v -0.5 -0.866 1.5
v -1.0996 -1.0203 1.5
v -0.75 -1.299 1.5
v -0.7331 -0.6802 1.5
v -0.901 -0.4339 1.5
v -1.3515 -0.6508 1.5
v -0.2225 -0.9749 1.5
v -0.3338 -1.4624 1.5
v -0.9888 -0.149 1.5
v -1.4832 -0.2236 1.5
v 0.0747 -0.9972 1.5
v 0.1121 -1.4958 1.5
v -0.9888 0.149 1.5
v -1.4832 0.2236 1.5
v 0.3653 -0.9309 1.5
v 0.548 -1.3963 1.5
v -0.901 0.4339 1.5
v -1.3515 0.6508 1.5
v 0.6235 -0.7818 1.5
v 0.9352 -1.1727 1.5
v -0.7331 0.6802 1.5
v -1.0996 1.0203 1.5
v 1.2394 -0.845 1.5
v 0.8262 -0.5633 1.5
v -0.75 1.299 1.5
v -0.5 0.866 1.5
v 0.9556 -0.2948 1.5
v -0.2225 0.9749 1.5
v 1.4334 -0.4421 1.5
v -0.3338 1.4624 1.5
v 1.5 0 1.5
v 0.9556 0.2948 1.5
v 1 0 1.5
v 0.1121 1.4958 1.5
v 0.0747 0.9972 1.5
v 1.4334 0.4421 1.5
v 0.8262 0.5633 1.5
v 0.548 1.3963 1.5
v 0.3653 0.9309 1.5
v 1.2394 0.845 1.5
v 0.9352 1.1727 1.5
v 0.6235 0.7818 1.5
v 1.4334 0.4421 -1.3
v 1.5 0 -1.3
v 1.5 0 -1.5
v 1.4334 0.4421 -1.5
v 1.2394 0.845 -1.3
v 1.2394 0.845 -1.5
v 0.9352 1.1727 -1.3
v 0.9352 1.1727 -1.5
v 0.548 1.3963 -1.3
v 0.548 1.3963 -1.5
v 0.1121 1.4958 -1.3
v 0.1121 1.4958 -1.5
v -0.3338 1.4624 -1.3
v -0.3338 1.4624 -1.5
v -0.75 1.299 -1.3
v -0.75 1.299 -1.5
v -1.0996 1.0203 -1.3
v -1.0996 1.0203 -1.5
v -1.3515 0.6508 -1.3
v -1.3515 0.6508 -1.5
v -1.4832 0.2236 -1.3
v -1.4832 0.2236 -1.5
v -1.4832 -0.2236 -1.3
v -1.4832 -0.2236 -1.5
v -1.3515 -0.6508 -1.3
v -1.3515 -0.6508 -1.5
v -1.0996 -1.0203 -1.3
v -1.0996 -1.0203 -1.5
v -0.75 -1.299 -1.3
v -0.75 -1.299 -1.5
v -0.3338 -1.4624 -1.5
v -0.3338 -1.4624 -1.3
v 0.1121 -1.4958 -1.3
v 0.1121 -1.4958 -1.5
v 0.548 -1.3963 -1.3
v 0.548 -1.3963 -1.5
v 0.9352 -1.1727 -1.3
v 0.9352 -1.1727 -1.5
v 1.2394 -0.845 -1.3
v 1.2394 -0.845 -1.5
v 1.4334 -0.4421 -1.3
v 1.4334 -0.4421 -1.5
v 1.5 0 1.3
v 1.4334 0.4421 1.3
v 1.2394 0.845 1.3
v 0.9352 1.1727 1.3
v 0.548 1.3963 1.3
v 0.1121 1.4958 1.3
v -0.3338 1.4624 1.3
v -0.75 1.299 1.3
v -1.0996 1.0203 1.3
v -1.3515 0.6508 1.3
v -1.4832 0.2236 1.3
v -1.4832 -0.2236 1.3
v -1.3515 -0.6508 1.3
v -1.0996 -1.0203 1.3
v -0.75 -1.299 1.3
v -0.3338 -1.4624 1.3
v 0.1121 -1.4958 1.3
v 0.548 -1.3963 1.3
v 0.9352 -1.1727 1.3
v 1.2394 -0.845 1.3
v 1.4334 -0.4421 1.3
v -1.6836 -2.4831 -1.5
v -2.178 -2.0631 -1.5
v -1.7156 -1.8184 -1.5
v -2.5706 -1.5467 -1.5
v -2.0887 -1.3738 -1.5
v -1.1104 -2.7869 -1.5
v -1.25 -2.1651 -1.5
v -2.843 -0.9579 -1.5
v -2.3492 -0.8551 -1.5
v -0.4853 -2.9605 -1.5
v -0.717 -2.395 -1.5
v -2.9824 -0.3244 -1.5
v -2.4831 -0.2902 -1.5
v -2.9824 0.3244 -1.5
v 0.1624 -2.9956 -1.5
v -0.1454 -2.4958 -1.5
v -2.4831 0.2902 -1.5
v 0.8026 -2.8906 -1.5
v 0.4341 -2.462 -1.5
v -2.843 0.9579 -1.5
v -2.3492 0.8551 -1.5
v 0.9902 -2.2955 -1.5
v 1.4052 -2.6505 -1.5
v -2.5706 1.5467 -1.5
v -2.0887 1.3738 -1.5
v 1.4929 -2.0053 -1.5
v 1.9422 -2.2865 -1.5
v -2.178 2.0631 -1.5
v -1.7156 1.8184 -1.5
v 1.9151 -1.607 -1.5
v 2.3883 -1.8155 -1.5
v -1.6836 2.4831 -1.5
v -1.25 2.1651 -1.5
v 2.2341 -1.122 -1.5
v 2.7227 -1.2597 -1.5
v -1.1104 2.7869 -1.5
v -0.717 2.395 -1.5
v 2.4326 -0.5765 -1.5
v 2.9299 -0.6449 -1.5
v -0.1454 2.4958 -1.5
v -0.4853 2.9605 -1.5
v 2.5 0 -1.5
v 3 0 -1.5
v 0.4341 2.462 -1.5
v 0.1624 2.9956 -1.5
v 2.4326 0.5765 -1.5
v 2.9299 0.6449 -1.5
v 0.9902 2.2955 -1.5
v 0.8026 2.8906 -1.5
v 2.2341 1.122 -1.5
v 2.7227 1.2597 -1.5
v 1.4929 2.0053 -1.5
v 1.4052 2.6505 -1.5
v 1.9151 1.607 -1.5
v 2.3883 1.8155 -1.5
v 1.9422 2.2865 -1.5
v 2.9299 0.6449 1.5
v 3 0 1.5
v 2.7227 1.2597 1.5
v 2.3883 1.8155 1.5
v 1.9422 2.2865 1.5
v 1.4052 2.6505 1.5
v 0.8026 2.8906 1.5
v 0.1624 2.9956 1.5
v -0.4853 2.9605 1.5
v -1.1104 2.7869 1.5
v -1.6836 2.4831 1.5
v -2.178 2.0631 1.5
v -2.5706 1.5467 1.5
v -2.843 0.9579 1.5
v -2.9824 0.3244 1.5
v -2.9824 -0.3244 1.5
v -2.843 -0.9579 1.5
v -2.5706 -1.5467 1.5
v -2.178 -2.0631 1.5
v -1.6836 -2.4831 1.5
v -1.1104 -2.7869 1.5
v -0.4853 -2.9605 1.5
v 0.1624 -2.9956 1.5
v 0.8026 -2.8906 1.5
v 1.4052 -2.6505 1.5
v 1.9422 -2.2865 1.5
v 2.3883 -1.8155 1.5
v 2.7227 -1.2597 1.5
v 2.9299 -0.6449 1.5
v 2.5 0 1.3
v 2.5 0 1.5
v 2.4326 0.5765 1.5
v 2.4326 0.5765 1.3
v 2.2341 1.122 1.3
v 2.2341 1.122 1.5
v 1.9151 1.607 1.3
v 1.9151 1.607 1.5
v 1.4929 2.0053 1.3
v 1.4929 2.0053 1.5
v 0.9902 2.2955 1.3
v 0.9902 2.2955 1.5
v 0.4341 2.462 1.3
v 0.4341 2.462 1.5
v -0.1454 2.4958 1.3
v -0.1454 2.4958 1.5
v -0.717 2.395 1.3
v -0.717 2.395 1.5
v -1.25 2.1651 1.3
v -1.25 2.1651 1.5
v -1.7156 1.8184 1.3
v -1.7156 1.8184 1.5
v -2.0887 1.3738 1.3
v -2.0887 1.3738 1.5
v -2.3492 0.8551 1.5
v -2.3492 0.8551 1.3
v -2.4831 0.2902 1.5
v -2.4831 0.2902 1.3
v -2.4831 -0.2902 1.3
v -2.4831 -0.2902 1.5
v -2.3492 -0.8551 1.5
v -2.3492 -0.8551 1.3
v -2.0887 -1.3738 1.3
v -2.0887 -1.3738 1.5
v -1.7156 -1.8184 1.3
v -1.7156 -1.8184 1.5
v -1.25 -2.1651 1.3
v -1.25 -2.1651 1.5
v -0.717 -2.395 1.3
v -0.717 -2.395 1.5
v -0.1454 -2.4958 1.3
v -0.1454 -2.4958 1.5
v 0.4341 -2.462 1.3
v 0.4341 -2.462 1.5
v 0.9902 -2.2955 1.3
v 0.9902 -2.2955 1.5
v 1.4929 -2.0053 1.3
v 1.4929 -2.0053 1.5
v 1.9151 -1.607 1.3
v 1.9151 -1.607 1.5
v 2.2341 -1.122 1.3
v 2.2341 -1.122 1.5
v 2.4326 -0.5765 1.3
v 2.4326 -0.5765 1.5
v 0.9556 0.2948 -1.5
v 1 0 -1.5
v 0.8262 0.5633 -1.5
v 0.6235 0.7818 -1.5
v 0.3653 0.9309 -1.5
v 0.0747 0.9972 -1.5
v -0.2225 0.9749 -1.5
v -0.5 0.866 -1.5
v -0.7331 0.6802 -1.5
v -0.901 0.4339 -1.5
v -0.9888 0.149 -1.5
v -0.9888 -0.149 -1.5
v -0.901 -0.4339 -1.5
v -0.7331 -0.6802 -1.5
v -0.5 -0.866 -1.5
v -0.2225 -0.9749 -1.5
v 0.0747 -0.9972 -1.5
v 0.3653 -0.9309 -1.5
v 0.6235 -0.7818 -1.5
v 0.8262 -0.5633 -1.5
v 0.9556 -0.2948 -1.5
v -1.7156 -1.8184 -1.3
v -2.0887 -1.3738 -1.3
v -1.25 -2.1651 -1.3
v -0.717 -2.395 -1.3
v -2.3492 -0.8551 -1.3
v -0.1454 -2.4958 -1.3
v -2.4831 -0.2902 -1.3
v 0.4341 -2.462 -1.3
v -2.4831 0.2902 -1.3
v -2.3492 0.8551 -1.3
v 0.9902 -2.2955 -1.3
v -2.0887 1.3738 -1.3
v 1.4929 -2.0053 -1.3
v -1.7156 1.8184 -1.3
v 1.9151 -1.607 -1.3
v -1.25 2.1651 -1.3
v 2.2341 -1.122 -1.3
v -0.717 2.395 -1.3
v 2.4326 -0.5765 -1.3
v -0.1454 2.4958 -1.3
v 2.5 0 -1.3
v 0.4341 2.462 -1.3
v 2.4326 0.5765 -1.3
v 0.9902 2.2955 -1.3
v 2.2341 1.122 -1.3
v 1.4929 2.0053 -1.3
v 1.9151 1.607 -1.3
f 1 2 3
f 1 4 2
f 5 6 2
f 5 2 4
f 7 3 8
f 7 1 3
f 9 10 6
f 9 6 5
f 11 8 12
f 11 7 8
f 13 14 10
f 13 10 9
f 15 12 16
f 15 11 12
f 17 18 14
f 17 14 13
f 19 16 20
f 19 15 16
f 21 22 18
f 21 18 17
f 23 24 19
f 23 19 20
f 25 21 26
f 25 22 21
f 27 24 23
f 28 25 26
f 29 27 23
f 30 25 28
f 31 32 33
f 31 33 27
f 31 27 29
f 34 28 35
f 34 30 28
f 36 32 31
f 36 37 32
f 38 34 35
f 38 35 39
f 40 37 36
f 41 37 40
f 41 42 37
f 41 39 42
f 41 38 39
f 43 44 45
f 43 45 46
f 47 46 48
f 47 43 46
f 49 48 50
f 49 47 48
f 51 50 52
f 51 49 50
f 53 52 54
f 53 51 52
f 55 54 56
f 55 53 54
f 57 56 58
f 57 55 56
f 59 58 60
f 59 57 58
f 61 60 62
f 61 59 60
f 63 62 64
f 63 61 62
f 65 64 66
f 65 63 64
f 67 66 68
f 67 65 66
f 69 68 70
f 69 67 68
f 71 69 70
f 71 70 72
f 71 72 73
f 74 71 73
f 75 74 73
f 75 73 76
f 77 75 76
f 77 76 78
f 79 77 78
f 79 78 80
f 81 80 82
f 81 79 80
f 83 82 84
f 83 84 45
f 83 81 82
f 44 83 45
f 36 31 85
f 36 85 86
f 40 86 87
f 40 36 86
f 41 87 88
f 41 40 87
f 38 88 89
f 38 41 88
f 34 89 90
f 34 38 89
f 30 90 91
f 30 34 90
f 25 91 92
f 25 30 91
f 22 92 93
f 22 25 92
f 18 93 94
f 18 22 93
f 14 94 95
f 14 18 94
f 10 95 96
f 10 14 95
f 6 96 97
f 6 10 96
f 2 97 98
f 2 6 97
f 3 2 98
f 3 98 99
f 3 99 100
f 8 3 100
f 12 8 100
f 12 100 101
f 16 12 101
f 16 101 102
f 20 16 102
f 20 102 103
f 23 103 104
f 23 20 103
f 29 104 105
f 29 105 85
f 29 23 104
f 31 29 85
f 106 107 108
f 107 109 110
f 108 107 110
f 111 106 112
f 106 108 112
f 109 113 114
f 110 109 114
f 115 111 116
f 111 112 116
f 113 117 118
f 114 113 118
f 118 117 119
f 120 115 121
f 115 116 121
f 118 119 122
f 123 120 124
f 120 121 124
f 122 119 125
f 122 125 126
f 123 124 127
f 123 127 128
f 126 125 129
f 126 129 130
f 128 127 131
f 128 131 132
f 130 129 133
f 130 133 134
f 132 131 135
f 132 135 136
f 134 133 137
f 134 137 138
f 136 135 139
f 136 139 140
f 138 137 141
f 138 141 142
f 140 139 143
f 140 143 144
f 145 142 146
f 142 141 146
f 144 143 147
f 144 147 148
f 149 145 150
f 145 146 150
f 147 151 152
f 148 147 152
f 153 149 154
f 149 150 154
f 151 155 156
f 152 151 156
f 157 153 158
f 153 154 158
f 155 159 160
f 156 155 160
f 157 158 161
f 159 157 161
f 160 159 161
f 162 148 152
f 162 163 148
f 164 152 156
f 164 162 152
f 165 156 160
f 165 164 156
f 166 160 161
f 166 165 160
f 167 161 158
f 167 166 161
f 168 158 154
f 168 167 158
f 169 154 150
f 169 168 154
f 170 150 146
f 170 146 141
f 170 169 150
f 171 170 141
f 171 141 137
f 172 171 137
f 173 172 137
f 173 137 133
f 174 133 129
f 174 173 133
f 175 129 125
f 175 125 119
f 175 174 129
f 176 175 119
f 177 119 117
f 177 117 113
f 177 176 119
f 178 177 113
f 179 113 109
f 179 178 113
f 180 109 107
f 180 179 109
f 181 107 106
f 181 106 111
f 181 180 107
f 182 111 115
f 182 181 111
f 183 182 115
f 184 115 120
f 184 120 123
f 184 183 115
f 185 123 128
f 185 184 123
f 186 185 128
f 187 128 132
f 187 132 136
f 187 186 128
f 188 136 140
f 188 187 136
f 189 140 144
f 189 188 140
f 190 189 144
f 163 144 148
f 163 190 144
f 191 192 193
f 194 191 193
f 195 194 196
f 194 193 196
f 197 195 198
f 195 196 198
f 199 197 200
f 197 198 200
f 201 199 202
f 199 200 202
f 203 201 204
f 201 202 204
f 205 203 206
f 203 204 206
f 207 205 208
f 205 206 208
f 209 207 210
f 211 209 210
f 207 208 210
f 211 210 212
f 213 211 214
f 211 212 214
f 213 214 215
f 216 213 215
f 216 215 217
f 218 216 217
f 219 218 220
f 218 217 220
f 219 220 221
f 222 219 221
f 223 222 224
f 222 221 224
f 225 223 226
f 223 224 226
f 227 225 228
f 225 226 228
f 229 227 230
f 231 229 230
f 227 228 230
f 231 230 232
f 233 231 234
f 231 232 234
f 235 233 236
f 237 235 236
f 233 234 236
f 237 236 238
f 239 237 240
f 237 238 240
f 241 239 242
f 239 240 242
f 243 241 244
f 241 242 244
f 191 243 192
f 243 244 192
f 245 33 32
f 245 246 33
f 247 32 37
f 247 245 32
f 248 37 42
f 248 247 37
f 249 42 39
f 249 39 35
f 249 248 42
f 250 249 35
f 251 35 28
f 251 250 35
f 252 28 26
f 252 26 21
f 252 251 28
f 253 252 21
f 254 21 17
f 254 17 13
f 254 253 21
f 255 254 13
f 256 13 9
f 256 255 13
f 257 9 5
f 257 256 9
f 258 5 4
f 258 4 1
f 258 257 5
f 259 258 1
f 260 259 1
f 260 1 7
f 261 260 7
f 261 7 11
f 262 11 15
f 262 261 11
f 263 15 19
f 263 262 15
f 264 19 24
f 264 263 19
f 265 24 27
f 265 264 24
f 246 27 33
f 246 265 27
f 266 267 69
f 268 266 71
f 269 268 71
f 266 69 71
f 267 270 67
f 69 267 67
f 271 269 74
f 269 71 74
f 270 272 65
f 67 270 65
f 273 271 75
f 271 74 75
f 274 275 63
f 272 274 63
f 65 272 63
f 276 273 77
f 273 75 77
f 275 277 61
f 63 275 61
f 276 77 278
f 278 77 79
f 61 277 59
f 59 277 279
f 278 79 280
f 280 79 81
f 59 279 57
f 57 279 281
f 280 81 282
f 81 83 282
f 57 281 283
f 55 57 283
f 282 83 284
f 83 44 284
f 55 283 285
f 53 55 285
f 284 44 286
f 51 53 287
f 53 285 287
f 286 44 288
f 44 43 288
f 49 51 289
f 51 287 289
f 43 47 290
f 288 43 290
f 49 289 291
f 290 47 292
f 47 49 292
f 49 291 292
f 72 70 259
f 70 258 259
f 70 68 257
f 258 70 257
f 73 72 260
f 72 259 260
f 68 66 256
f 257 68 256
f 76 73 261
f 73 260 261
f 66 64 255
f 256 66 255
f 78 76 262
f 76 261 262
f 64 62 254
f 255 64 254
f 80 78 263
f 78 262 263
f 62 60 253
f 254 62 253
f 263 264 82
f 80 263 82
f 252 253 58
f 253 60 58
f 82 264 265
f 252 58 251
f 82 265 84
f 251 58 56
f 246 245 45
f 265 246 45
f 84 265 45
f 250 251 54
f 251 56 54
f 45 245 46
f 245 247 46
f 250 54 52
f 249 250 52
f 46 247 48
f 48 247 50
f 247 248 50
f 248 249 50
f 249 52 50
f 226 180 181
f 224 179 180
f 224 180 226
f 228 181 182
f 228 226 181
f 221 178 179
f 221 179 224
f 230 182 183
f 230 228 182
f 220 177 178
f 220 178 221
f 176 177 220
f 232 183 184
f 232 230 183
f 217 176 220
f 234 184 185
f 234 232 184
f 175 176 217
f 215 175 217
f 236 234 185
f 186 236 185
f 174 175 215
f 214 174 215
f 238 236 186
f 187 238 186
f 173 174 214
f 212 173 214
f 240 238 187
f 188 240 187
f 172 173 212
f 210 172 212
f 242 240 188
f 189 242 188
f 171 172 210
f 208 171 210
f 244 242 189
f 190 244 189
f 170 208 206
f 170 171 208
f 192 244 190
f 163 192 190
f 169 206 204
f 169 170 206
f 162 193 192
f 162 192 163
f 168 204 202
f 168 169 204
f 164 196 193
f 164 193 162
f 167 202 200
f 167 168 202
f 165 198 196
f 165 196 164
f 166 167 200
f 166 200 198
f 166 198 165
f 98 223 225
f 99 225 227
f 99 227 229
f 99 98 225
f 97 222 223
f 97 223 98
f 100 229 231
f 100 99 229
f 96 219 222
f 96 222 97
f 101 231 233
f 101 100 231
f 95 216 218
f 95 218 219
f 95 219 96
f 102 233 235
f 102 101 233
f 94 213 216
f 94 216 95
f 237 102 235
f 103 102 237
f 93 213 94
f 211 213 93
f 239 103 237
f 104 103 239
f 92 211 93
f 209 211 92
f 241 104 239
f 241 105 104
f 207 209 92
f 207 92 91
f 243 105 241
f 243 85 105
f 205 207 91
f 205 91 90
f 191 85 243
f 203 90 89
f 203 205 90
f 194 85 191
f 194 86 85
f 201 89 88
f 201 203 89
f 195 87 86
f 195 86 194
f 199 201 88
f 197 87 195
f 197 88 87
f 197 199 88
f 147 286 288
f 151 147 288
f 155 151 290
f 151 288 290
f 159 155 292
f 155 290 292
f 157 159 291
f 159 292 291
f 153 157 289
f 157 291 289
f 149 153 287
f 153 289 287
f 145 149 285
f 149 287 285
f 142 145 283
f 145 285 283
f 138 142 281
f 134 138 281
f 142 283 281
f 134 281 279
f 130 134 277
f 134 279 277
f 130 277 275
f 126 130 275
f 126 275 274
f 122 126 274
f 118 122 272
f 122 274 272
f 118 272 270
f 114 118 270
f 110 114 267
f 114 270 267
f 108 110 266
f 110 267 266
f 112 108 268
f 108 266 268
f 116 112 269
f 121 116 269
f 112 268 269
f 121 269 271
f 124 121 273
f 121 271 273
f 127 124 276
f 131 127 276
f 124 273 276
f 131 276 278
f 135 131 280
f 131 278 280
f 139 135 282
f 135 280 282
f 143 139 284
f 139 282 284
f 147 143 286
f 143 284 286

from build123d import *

# Parameters (mm, degrees)
SKETCH1_R           = 3
SKETCH1_R_2         = 1
BOSS_EXTRUDE1_DEPTH = 1.5
SKETCH2_R           = 2.5
SKETCH2_R_2         = 1.5
CUT_EXTRUDE1_DEPTH  = 0.2
CUT_EXTRUDE2_START  = -2.8
SKETCH2_2_R         = 2.5
SKETCH2_2_R_2       = 1.5
CUT_EXTRUDE2_DEPTH  = 0.2


with BuildPart() as part:
    # Sketch1 → Boss-Extrude1 (new, symmetric)
    with BuildSketch(Plane.XY):
        Circle(SKETCH1_R)
        Circle(SKETCH1_R_2, mode=Mode.SUBTRACT)
    extrude(amount=BOSS_EXTRUDE1_DEPTH, both=True)

    # Sketch2 → Cut-Extrude1 (cut)
    with BuildSketch(Plane.XY.offset(1.5)):
        Circle(SKETCH2_R)
        Circle(SKETCH2_R_2, mode=Mode.SUBTRACT)
    extrude(amount=-CUT_EXTRUDE1_DEPTH, mode=Mode.SUBTRACT)

    # Sketch2<2> → Cut-Extrude2 (cut)
    with BuildSketch(Plane.XY.offset(1.5).offset(CUT_EXTRUDE2_START)):
        Circle(SKETCH2_2_R)
        Circle(SKETCH2_2_R_2, mode=Mode.SUBTRACT)
    extrude(amount=-CUT_EXTRUDE2_DEPTH, mode=Mode.SUBTRACT)


solid = part.part
